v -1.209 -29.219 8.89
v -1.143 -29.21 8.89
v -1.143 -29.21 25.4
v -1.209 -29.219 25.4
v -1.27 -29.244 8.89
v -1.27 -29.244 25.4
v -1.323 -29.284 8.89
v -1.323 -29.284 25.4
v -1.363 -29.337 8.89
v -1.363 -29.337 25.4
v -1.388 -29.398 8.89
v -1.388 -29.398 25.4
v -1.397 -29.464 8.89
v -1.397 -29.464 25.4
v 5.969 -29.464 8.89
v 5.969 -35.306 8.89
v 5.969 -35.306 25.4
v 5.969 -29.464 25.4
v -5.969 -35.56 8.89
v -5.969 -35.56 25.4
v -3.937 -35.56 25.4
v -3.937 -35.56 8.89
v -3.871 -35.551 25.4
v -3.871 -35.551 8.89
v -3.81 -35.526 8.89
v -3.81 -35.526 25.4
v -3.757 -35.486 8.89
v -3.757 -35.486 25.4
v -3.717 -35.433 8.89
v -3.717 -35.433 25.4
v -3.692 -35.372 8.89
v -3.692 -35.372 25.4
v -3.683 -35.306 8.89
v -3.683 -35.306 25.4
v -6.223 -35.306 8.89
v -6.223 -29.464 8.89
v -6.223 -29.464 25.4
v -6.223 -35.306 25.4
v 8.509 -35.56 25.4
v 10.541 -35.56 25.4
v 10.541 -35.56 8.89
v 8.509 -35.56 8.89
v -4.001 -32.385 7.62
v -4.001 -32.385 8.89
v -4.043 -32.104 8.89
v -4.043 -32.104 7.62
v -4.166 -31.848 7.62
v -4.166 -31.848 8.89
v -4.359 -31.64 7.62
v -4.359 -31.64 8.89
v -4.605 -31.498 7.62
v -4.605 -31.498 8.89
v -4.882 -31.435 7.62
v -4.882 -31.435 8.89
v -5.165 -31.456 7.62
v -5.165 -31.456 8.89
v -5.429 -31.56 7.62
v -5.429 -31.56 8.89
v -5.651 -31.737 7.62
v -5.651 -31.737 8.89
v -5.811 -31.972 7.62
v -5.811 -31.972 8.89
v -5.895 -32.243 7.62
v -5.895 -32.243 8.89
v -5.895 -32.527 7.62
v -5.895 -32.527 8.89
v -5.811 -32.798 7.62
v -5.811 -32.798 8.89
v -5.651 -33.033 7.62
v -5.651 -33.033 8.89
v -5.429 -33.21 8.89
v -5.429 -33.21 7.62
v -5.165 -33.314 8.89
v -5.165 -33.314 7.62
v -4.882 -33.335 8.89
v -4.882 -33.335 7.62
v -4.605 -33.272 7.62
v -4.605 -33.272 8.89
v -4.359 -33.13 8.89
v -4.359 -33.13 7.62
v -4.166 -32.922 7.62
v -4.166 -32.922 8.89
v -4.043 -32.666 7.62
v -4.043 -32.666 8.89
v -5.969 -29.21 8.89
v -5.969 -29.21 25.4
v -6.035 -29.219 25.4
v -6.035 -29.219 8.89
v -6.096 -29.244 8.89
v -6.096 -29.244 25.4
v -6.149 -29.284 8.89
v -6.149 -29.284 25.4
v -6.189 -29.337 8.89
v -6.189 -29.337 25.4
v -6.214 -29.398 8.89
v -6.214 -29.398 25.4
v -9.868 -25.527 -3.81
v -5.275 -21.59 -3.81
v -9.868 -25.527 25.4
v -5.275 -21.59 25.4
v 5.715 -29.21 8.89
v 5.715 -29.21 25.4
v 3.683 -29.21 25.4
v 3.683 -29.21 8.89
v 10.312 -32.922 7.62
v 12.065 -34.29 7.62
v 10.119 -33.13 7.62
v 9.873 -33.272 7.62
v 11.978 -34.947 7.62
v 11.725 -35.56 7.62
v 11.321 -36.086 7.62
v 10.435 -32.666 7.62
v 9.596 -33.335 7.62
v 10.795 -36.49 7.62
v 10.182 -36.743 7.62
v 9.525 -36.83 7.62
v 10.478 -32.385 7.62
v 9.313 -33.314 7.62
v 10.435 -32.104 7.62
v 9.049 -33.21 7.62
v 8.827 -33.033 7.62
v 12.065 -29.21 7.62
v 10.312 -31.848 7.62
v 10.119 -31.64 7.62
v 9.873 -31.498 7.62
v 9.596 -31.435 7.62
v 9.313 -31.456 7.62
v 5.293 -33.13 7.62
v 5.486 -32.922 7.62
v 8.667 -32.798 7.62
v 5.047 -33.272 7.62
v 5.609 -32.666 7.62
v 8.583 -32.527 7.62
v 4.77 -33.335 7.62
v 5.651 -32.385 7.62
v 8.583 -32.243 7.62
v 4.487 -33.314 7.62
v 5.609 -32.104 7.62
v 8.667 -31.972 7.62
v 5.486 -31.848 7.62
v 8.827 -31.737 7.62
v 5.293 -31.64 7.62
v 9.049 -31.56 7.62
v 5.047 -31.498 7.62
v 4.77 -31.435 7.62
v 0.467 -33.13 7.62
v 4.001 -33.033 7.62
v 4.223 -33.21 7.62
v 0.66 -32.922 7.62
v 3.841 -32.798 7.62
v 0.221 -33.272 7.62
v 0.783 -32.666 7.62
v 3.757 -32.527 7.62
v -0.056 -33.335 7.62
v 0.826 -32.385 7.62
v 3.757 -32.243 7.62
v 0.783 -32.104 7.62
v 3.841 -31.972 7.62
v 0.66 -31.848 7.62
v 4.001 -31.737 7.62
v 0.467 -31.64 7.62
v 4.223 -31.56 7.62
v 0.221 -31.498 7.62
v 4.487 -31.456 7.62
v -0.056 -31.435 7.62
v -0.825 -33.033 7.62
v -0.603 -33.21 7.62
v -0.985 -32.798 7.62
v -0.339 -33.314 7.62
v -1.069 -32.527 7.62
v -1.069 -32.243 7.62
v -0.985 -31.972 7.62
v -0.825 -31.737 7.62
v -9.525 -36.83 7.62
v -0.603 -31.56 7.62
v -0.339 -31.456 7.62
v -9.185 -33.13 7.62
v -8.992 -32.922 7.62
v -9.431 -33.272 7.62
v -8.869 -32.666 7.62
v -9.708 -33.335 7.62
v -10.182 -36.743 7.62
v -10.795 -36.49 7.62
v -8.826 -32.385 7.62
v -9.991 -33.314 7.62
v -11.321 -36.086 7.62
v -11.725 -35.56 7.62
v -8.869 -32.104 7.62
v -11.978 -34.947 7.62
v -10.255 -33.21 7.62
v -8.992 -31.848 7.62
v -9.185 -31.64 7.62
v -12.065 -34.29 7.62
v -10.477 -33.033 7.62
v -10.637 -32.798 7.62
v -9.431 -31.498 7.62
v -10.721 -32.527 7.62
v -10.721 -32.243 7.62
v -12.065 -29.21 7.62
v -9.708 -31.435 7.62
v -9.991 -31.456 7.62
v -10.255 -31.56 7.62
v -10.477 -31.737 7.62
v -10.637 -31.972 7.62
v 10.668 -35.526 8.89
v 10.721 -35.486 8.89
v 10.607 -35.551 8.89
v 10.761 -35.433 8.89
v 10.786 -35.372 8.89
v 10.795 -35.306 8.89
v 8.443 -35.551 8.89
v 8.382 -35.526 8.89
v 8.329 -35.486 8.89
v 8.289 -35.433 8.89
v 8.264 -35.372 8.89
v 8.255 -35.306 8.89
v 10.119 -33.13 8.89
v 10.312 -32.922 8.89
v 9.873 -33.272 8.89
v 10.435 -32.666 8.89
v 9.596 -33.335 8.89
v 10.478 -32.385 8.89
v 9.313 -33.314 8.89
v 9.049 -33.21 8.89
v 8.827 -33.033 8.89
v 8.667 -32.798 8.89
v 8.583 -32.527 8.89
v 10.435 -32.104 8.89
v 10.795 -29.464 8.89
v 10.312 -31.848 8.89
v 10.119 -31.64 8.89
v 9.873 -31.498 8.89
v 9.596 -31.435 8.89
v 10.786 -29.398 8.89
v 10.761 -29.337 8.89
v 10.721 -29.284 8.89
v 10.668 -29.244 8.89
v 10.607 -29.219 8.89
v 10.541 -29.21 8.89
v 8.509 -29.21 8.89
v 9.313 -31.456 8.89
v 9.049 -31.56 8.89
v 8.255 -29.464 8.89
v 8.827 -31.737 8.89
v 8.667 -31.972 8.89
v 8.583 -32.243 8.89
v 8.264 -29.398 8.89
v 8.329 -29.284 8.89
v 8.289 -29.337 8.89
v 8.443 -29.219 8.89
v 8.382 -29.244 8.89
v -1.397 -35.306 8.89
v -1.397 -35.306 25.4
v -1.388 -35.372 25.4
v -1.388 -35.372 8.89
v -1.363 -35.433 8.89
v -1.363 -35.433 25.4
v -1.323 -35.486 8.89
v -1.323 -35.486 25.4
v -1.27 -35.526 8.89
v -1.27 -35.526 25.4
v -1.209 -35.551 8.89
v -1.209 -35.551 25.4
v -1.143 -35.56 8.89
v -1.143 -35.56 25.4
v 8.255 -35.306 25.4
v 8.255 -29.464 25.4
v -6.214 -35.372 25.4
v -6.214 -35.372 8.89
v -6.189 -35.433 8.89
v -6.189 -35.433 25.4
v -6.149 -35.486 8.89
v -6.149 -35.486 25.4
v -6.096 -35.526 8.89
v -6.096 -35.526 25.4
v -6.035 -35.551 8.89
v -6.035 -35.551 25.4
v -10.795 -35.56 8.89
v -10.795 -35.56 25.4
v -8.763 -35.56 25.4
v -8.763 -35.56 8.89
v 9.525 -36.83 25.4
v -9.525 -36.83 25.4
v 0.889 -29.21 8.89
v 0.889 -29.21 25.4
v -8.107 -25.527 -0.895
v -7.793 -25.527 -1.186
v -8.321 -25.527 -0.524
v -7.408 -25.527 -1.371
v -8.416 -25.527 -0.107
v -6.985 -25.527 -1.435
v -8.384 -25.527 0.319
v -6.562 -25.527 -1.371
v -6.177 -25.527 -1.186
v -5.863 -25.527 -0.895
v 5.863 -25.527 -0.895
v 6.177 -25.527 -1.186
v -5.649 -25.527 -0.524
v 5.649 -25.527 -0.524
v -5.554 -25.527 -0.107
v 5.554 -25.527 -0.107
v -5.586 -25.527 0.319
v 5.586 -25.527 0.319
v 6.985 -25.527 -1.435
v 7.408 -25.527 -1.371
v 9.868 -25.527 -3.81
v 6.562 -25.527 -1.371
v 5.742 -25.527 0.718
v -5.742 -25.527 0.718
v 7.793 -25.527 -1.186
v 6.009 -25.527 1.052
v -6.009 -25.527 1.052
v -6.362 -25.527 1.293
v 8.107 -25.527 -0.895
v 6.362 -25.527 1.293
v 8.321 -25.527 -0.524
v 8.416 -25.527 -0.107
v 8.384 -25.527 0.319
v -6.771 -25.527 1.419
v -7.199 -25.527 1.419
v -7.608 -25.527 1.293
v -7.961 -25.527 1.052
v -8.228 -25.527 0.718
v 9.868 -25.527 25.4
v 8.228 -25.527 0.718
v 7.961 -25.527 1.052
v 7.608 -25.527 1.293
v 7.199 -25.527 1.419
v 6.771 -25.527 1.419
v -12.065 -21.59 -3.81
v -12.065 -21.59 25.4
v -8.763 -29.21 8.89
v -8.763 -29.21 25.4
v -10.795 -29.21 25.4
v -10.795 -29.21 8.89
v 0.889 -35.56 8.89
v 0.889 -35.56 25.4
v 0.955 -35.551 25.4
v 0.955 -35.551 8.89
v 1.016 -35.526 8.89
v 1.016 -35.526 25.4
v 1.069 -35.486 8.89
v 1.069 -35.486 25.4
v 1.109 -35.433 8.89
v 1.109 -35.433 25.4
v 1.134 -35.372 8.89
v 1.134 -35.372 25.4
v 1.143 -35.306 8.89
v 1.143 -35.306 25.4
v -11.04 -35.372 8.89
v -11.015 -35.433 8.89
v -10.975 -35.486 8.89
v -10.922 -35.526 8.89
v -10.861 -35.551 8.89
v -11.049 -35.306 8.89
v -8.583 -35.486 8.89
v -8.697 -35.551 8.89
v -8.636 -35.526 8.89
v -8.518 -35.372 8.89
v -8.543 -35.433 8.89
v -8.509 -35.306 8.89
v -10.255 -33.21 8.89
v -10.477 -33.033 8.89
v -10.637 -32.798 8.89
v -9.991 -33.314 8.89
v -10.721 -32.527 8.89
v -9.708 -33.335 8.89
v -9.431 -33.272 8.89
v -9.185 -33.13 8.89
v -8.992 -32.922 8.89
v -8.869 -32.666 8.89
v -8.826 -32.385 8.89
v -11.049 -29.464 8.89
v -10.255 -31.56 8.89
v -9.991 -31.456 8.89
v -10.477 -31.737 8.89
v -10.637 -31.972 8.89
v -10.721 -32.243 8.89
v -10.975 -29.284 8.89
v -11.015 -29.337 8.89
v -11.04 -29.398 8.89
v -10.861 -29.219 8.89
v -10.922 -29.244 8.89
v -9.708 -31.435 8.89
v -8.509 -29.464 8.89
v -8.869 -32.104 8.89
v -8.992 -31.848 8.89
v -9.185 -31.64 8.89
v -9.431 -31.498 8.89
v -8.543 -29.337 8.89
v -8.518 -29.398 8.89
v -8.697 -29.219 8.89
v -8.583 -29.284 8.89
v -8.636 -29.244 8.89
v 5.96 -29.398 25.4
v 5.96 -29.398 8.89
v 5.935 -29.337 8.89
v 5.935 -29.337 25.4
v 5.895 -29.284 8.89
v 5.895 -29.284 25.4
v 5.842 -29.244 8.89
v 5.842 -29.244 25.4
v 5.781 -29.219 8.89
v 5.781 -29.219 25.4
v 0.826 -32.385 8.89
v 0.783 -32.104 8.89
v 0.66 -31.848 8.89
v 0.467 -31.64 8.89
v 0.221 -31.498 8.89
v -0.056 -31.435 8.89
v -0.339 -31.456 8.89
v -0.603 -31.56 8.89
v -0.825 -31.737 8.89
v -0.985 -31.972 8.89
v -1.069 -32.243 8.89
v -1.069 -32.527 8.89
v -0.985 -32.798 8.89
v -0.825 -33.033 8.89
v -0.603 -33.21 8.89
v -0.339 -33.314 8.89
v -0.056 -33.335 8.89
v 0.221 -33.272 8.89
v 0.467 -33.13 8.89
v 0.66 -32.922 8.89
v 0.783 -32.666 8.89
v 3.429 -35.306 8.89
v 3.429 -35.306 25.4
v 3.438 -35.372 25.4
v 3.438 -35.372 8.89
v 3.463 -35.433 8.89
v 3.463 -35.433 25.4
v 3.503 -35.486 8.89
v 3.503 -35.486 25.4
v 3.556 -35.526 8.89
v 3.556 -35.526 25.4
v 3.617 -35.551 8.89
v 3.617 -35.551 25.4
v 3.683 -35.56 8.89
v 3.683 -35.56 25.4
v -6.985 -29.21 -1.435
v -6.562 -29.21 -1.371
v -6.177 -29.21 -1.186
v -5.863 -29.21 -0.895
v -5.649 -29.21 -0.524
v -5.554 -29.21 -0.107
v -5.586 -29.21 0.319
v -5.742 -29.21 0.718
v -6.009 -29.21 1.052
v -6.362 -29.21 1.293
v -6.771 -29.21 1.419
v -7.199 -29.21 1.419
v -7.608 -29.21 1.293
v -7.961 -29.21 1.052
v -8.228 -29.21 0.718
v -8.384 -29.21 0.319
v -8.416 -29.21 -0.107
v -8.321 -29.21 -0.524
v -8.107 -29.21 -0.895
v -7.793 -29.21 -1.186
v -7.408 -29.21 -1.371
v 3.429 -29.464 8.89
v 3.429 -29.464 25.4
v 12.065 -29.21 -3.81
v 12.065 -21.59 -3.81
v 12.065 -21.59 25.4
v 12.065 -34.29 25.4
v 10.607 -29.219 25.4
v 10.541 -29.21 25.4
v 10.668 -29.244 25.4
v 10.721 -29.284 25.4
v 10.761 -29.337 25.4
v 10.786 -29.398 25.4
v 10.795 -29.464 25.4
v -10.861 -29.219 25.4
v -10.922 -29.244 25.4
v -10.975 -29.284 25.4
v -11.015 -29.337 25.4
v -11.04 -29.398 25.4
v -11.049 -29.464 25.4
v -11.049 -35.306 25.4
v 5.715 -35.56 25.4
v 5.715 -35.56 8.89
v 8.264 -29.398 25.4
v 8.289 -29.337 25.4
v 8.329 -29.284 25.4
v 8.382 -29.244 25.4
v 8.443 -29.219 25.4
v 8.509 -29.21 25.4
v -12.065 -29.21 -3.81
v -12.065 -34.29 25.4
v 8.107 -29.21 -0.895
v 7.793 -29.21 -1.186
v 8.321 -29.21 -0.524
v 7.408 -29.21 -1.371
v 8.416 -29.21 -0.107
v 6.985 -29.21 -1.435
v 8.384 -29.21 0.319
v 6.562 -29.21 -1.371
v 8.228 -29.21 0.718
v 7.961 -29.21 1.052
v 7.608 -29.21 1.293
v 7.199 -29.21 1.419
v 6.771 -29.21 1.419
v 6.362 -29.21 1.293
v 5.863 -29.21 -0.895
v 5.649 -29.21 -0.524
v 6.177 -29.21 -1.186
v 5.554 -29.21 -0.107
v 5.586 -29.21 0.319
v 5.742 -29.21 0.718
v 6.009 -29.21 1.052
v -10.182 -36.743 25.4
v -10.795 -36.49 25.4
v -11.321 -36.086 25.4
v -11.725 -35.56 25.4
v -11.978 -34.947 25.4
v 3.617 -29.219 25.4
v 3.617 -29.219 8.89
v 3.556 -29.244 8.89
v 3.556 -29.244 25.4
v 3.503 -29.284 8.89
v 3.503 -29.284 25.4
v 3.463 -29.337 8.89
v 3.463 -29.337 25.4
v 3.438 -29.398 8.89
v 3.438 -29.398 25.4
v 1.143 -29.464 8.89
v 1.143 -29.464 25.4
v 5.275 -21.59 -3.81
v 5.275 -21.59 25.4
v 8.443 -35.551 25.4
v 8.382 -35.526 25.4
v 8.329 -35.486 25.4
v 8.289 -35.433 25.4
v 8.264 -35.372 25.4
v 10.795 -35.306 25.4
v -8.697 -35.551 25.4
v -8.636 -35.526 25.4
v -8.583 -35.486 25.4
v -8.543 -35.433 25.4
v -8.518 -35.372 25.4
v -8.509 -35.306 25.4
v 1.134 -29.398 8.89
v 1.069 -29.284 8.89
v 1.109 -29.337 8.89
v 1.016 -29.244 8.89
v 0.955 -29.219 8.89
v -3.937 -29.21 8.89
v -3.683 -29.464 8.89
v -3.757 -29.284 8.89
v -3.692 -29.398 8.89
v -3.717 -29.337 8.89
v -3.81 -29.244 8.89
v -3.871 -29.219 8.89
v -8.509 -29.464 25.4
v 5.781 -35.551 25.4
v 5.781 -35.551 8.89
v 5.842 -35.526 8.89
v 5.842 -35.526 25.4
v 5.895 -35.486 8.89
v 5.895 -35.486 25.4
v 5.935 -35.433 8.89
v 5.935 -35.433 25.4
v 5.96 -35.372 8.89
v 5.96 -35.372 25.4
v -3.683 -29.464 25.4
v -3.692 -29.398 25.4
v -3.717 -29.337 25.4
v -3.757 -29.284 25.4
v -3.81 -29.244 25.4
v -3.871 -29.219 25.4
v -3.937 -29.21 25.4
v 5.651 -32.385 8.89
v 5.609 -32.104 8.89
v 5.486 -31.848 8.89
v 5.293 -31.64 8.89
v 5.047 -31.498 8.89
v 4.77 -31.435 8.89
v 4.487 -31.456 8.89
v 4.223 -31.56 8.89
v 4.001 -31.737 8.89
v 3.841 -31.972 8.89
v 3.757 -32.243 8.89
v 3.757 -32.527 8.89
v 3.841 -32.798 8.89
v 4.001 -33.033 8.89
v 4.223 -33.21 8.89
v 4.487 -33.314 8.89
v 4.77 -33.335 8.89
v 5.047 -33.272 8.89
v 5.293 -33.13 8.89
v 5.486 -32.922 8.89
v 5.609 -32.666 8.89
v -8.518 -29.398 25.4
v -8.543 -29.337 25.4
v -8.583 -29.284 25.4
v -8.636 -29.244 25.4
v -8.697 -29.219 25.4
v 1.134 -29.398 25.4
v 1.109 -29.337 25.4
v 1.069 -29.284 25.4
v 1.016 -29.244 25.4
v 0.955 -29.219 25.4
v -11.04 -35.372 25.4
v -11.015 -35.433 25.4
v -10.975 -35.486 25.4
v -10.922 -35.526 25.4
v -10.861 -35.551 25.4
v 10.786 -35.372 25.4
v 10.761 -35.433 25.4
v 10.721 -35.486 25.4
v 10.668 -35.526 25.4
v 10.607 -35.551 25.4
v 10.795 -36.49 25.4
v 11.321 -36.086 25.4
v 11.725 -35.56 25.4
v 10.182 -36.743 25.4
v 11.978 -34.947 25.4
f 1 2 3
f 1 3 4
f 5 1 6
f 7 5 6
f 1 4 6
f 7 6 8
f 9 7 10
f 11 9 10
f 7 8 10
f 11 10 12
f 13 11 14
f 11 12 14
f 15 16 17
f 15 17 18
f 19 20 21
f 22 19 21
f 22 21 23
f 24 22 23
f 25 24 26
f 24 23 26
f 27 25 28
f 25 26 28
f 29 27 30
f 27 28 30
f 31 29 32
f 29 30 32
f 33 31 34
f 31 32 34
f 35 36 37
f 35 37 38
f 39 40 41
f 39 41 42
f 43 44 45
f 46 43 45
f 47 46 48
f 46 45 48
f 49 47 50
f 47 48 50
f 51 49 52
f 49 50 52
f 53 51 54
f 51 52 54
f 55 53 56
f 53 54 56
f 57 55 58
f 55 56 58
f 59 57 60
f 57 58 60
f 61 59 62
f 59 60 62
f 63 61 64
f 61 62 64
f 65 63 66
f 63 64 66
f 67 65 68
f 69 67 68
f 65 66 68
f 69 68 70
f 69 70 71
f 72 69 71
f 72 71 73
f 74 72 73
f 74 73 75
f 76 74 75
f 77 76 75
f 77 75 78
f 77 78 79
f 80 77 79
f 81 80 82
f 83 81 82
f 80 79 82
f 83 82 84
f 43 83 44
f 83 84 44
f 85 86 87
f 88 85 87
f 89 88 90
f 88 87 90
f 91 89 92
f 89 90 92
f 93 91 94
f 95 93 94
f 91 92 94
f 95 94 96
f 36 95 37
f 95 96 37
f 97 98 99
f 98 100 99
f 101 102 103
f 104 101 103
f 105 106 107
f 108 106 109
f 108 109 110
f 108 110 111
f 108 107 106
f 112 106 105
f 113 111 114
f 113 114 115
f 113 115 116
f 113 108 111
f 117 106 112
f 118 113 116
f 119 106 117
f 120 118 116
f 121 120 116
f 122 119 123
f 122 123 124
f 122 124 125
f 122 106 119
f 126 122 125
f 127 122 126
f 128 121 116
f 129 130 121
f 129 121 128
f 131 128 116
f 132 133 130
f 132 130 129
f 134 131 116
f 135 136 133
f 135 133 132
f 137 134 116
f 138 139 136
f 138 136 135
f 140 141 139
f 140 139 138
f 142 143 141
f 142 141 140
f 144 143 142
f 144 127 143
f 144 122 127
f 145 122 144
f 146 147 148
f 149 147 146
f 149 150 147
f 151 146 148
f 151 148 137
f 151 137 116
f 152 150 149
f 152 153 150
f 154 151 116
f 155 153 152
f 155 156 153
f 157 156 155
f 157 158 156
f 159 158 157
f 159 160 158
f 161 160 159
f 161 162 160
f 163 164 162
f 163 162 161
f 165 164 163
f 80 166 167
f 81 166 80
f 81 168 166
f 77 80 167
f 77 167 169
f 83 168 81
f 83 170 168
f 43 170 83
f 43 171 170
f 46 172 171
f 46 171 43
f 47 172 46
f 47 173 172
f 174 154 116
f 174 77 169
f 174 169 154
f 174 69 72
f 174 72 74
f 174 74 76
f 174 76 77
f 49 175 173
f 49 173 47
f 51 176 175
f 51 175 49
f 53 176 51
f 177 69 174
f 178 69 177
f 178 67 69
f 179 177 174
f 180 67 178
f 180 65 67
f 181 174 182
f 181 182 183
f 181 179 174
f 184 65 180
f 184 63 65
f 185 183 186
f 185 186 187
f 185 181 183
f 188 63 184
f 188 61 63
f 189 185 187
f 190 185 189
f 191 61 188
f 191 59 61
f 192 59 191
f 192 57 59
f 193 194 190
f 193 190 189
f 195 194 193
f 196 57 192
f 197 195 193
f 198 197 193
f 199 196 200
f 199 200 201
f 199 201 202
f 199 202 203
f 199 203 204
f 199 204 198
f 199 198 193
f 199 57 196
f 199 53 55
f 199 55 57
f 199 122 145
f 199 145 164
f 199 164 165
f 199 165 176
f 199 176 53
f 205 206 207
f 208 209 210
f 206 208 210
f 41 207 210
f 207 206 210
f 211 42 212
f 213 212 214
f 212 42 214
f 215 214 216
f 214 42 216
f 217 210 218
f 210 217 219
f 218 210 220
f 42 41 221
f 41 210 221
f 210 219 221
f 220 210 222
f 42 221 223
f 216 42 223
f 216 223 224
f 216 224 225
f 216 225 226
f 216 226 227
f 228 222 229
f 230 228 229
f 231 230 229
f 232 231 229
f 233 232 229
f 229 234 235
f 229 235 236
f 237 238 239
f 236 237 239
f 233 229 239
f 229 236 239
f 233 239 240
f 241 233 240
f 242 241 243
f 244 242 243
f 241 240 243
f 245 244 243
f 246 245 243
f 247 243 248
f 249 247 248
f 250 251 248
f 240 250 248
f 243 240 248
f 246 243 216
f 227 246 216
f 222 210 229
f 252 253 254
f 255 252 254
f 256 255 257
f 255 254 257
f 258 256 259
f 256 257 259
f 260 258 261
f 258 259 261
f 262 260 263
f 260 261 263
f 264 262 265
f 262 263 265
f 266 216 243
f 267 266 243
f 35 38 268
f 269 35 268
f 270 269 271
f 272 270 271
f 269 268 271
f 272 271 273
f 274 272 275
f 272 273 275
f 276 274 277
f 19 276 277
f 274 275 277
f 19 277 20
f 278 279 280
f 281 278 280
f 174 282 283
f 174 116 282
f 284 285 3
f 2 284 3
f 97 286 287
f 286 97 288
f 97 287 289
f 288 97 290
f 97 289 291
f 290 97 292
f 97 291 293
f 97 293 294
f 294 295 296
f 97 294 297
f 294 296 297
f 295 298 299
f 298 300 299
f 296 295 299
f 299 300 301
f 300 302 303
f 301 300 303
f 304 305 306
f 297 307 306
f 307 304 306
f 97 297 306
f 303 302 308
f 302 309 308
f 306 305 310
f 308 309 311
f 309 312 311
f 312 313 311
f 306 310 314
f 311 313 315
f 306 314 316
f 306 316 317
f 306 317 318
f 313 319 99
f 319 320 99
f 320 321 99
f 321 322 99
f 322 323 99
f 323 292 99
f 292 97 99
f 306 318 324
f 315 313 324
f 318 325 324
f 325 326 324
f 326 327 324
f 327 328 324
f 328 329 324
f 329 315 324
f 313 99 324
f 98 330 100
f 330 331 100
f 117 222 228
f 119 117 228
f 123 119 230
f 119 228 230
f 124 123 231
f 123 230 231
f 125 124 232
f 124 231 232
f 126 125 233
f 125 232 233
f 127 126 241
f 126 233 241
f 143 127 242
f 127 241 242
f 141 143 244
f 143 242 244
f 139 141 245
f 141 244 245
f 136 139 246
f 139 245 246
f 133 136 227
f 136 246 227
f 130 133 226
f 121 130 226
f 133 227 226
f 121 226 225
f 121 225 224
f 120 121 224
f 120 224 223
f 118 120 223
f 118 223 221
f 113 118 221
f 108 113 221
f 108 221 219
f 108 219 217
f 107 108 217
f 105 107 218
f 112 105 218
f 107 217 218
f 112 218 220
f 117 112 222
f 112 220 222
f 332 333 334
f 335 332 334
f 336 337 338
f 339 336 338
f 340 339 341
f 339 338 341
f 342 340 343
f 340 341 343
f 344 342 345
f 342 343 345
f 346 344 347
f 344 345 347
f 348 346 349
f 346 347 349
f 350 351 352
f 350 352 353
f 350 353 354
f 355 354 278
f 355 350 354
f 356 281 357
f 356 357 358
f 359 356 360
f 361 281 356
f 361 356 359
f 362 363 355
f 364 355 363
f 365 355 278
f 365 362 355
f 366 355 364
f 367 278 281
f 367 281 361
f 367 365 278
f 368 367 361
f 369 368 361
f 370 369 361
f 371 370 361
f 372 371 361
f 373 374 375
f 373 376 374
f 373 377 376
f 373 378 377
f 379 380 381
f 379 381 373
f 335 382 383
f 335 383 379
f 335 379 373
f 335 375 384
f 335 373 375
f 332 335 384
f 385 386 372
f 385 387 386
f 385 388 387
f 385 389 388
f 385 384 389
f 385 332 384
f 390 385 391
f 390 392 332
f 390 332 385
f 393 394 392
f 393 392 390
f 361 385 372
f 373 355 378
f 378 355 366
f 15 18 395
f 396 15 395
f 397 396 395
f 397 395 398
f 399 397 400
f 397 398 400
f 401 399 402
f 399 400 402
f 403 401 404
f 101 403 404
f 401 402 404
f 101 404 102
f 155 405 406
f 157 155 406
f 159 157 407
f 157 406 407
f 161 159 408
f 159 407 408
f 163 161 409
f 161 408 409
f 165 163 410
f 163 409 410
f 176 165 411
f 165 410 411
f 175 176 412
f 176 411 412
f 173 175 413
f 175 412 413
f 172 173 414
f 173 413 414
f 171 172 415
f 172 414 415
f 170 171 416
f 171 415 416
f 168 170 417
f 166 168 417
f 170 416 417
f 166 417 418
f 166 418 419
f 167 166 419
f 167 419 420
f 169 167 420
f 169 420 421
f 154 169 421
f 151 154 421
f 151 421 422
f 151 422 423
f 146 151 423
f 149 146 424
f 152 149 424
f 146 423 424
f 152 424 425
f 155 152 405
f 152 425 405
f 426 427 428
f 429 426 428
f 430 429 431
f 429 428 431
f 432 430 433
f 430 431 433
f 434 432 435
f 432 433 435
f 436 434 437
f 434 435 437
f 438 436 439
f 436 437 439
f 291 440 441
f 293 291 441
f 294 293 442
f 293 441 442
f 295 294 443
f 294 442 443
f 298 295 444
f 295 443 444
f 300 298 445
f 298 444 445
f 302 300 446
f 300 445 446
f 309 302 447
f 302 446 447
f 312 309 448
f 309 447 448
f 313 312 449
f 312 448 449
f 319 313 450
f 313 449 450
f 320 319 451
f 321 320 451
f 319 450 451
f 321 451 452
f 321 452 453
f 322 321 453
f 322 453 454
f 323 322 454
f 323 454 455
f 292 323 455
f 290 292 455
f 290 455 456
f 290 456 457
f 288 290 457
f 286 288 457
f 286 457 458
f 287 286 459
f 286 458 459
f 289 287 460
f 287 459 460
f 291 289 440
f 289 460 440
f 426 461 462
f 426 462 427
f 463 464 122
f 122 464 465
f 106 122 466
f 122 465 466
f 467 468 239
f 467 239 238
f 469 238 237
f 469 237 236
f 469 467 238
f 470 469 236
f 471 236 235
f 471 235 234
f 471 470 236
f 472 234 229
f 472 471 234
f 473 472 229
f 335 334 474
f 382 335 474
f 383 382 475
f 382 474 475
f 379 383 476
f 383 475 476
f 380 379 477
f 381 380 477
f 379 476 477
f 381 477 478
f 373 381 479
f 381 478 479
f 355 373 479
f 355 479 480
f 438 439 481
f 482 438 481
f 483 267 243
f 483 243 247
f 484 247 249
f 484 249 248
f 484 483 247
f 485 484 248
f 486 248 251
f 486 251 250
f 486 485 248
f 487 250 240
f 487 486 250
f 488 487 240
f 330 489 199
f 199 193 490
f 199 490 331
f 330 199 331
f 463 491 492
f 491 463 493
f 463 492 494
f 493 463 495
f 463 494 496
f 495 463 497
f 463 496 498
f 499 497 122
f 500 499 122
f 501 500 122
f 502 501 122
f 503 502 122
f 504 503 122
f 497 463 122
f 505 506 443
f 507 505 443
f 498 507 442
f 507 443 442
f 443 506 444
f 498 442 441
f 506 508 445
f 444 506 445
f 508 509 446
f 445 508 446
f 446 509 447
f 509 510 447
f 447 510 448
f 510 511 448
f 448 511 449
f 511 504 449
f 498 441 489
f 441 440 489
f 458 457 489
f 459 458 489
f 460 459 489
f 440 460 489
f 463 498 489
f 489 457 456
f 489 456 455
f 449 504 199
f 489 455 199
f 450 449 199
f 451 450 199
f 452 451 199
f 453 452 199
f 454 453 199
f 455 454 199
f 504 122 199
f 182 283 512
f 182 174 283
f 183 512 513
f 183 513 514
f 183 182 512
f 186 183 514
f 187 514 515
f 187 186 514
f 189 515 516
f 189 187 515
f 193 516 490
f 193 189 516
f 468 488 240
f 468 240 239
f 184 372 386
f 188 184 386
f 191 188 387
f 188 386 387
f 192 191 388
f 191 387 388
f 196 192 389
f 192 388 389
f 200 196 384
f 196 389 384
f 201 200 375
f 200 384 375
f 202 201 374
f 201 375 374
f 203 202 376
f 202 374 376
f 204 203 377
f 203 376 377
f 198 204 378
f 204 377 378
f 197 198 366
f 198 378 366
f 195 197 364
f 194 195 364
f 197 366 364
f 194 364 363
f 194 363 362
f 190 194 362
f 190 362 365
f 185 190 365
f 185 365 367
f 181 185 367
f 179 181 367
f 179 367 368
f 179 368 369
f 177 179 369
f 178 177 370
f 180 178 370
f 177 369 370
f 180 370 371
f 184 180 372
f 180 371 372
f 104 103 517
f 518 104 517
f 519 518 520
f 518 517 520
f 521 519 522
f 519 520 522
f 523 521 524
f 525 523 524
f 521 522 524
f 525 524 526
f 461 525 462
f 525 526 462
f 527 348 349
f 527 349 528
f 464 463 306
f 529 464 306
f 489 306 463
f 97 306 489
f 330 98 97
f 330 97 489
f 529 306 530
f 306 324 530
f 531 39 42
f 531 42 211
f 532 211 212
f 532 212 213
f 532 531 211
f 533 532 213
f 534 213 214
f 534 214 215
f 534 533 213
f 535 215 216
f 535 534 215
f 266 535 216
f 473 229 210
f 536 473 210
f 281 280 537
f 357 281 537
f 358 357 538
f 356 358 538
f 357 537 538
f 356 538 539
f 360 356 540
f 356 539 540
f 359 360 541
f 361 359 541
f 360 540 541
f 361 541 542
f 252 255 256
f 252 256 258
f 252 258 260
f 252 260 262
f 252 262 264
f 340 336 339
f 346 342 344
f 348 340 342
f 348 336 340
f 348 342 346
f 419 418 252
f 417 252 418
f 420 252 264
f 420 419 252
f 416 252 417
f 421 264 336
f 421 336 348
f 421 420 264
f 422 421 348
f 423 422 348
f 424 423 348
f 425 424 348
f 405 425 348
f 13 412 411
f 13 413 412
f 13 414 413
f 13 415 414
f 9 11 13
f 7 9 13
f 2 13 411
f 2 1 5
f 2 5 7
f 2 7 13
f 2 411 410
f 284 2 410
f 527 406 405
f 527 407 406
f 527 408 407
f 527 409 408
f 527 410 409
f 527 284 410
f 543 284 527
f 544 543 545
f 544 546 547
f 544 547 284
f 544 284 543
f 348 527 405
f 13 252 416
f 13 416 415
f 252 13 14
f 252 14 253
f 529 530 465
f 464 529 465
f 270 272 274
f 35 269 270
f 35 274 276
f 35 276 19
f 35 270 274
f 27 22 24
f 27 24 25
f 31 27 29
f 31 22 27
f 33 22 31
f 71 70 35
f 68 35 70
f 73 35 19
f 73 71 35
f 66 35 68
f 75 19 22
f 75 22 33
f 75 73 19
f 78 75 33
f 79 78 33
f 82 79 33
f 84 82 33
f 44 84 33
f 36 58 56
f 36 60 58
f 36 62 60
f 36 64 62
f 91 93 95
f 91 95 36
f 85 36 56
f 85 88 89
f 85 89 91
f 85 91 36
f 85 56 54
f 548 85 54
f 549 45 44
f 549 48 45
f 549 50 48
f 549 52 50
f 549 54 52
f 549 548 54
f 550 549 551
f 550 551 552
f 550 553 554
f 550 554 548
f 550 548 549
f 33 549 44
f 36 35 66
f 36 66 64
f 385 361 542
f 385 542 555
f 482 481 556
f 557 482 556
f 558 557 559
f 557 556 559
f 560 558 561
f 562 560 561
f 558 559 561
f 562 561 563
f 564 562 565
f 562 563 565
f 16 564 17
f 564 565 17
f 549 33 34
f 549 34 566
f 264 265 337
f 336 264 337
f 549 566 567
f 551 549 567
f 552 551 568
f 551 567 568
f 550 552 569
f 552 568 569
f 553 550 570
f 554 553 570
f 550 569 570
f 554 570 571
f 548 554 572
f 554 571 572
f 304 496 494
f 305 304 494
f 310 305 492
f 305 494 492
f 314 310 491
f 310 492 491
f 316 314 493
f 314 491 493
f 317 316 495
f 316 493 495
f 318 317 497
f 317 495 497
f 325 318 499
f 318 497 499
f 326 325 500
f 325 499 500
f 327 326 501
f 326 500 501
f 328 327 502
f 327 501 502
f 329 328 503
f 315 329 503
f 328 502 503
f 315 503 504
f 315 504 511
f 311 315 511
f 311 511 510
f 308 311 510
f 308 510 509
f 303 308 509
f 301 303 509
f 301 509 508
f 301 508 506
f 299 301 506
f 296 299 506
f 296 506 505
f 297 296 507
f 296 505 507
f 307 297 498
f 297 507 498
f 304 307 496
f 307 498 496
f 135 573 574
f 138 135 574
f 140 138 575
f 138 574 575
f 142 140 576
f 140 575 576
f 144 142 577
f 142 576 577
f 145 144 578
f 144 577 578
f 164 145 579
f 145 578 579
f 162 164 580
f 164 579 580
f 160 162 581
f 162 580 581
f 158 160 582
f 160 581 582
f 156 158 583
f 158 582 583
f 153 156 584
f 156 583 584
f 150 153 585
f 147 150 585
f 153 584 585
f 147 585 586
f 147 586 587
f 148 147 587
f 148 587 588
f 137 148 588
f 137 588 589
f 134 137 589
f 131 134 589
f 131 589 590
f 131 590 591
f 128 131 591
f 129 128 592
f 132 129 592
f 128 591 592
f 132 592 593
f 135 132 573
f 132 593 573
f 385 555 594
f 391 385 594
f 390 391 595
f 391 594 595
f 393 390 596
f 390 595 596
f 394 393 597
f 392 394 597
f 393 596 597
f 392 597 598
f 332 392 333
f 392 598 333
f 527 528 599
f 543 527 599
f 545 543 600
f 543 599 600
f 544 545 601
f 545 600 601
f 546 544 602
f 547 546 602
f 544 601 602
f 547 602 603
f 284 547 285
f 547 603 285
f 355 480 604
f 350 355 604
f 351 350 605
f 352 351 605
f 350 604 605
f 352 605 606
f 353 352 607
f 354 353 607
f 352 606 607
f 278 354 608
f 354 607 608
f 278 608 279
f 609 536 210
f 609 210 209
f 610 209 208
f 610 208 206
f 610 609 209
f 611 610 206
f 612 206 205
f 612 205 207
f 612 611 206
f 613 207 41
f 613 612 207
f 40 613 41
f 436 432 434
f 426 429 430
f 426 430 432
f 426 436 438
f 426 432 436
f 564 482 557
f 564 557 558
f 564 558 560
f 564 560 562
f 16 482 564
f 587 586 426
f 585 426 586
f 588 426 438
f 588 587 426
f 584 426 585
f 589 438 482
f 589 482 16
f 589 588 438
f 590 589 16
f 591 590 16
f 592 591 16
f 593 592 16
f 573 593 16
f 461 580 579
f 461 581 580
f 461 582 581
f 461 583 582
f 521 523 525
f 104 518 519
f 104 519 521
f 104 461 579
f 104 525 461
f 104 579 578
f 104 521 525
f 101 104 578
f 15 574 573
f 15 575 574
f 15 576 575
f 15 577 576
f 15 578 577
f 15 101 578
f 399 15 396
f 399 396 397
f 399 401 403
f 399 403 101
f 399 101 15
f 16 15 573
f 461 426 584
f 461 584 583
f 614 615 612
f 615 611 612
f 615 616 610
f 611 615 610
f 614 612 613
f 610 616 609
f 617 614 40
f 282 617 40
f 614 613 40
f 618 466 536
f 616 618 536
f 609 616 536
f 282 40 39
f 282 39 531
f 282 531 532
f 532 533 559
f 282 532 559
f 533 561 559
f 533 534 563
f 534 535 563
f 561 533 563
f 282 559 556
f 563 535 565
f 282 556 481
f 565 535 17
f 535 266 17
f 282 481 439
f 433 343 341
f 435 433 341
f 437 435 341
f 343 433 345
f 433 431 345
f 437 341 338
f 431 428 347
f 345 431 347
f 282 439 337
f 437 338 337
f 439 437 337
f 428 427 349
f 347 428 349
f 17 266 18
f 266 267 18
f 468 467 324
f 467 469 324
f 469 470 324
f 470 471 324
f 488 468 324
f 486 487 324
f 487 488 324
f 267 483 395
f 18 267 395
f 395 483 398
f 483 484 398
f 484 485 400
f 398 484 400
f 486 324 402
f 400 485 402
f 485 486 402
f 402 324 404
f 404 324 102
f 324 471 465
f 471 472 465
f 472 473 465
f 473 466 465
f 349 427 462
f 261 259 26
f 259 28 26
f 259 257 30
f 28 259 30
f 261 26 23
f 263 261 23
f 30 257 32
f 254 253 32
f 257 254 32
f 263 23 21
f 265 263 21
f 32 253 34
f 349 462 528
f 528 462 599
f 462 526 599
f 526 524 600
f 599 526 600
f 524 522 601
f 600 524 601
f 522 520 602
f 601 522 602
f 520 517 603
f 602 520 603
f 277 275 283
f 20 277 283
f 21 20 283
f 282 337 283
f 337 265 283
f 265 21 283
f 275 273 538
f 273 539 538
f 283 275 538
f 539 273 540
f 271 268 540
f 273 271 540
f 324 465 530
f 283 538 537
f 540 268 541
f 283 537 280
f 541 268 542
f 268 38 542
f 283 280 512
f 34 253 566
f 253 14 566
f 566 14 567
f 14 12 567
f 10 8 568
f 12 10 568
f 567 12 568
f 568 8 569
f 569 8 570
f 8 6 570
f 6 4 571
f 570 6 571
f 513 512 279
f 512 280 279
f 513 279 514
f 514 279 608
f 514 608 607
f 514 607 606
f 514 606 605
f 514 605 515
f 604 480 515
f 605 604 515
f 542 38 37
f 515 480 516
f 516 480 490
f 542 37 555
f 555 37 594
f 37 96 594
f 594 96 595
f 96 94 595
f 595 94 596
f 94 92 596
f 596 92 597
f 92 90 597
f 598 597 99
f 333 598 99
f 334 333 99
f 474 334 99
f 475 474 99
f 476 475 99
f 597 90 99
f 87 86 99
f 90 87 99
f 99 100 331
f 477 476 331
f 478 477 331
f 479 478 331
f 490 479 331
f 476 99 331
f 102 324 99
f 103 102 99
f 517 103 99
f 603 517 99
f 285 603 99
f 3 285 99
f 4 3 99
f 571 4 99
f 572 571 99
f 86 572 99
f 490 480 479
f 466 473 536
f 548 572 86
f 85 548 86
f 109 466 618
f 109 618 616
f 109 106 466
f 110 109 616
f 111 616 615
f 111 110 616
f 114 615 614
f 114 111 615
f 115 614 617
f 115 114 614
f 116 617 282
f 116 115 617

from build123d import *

# Parameters (mm, degrees)
BOSS_EXTRUDE2_DEPTH = 25.4
SKETCH3_W           = 24.13
SKETCH3_H           = 17.78
BOSS_EXTRUDE3_DEPTH = 7.62
CUT_EXTRUDE2_DEPTH  = 16.51
SKETCH5_R           = 0.9525
CUT_EXTRUDE3_DEPTH  = 1.27
FILLET1_R           = 2.54
BOSS_EXTRUDE4_DEPTH = 3.81
SKETCH2_R           = 1.4351
CUT_EXTRUDE1_DEPTH  = 3.683


with BuildPart() as part:
    # Sketch1 → Boss-Extrude2 (new body)
    with BuildSketch(Plane.XY):
        Polygon((9.525, -21.59), (5.275147024, -21.59), (9.868313691, -25.527), (-9.868313691, -25.527), (-5.275147024, -21.59), (-9.525, -21.59), (-12.065, -21.59), (-12.065, -22.494104142), (-12.065, -29.21), (-8.343230433, -29.21), (10.89773699, -29.21), (12.065, -29.21), (12.065, -26.495103927), (12.065, -21.59), align=None)
    extrude(amount=BOSS_EXTRUDE2_DEPTH)

    # Sketch3 → Boss-Extrude3 (add)
    with BuildSketch(Plane(origin=(0, -29.21, 0), x_dir=(-1, 0, 0), z_dir=(0, -1, 0))):
        with Locations((0, -16.51)):
            Rectangle(SKETCH3_W, SKETCH3_H)
    extrude(amount=BOSS_EXTRUDE3_DEPTH)

    # Sketch4 → Cut-Extrude2 (cut)
    with BuildSketch(Plane.XY.offset(25.4)):
        with BuildLine():
            Line((10.541, -35.56), (8.509, -35.56))
            ThreePointArc((8.509, -35.56), (8.329394878, -35.485605122), (8.255, -35.306))
            Line((8.255, -35.306), (8.255, -29.464))
            ThreePointArc((8.255, -29.464), (8.329394878, -29.284394878), (8.509, -29.21))
            Line((8.509, -29.21), (10.541, -29.21))
            ThreePointArc((10.541, -29.21), (10.720605122, -29.284394878), (10.795, -29.464))
            Line((10.795, -29.464), (10.795, -35.306))
            ThreePointArc((10.795, -35.306), (10.720605122, -35.485605122), (10.541, -35.56))
        make_face()
        with BuildLine():
            Line((5.969, -35.306), (5.969, -29.464))
            ThreePointArc((5.969, -29.464), (5.894605122, -29.284394878), (5.715, -29.21))
            Line((5.715, -29.21), (3.683, -29.21))
            ThreePointArc((3.683, -29.21), (3.503394878, -29.284394878), (3.429, -29.464))
            Line((3.429, -29.464), (3.429, -35.306))
            ThreePointArc((3.429, -35.306), (3.503394878, -35.485605122), (3.683, -35.56))
            Line((3.683, -35.56), (5.715, -35.56))
            ThreePointArc((5.715, -35.56), (5.894605122, -35.485605122), (5.969, -35.306))
        make_face()
        with BuildLine():
            Line((1.143, -35.306), (1.143, -29.464))
            ThreePointArc((1.143, -29.464), (1.068605122, -29.284394878), (0.889, -29.21))
            Line((0.889, -29.21), (-1.143, -29.21))
            ThreePointArc((-1.143, -29.21), (-1.322605122, -29.284394878), (-1.397, -29.464))
            Line((-1.397, -29.464), (-1.397, -35.306))
            ThreePointArc((-1.397, -35.306), (-1.322605122, -35.485605122), (-1.143, -35.56))
            Line((-1.143, -35.56), (0.889, -35.56))
            ThreePointArc((0.889, -35.56), (1.068605122, -35.485605122), (1.143, -35.306))
        make_face()
        with BuildLine():
            Line((-3.683, -35.306), (-3.683, -29.464))
            ThreePointArc((-3.683, -29.464), (-3.757394878, -29.284394878), (-3.937, -29.21))
            Line((-3.937, -29.21), (-5.969, -29.21))
            ThreePointArc((-5.969, -29.21), (-6.148605122, -29.284394878), (-6.223, -29.464))
            Line((-6.223, -29.464), (-6.223, -35.306))
            ThreePointArc((-6.223, -35.306), (-6.148605122, -35.485605122), (-5.969, -35.56))
            Line((-5.969, -35.56), (-3.937, -35.56))
            ThreePointArc((-3.937, -35.56), (-3.757394878, -35.485605122), (-3.683, -35.306))
        make_face()
        with BuildLine():
            Line((-8.509, -35.306), (-8.509, -29.464))
            ThreePointArc((-8.509, -29.464), (-8.583394878, -29.284394878), (-8.763, -29.21))
            Line((-8.763, -29.21), (-10.795, -29.21))
            ThreePointArc((-10.795, -29.21), (-10.974605122, -29.284394878), (-11.049, -29.464))
            Line((-11.049, -29.464), (-11.049, -35.306))
            ThreePointArc((-11.049, -35.306), (-10.974605122, -35.485605122), (-10.795, -35.56))
            Line((-10.795, -35.56), (-8.763, -35.56))
            ThreePointArc((-8.763, -35.56), (-8.583394878, -35.485605122), (-8.509, -35.306))
        make_face()
    extrude(amount=-CUT_EXTRUDE2_DEPTH, mode=Mode.SUBTRACT)

    # Sketch5 → Cut-Extrude3 (cut)
    with BuildSketch(Plane.XY.offset(8.89)):
        with Locations((9.525, -32.385)):
            Circle(SKETCH5_R)
        with Locations((4.699, -32.385)):
            Circle(SKETCH5_R)
        with Locations((-0.127, -32.385)):
            Circle(SKETCH5_R)
        with Locations((-4.953, -32.385)):
            Circle(SKETCH5_R)
        with Locations((-9.779, -32.385)):
            Circle(SKETCH5_R)
    extrude(amount=-CUT_EXTRUDE3_DEPTH, mode=Mode.SUBTRACT)

    # Fillet1
    fillet1_edges = [part.edges().sort_by_distance(p)[0] for p in [
        (12.065, -36.83, 16.51),
        (-12.065, -36.83, 16.51),
    ]]
    fillet(fillet1_edges, radius=FILLET1_R)

    # Sketch6 → Boss-Extrude4 (add)
    with BuildSketch(Plane(origin=(0, 0, 0), x_dir=(-1, 0, 0), z_dir=(0, 0, -1))):
        Polygon((-12.065, -29.21), (12.065, -29.21), (12.065, -21.59), (5.275147024, -21.59), (9.868313691, -25.527), (-9.868313691, -25.527), (-5.275147024, -21.59), (-12.065, -21.59), align=None)
    extrude(amount=BOSS_EXTRUDE4_DEPTH)

    # Sketch2 → Cut-Extrude1 (cut)
    with BuildSketch(Plane(origin=(0, -29.21, 0), x_dir=(-1, 0, 0), z_dir=(0, -1, 0))):
        with Locations(Location((-6.985, 0, 0), (0, 0, 90))):
            Circle(SKETCH2_R)
        with Locations(Location((6.985, 0, 0), (0, 0, 90))):
            Circle(SKETCH2_R)
    extrude(amount=-CUT_EXTRUDE1_DEPTH, mode=Mode.SUBTRACT)


solid = part.part
